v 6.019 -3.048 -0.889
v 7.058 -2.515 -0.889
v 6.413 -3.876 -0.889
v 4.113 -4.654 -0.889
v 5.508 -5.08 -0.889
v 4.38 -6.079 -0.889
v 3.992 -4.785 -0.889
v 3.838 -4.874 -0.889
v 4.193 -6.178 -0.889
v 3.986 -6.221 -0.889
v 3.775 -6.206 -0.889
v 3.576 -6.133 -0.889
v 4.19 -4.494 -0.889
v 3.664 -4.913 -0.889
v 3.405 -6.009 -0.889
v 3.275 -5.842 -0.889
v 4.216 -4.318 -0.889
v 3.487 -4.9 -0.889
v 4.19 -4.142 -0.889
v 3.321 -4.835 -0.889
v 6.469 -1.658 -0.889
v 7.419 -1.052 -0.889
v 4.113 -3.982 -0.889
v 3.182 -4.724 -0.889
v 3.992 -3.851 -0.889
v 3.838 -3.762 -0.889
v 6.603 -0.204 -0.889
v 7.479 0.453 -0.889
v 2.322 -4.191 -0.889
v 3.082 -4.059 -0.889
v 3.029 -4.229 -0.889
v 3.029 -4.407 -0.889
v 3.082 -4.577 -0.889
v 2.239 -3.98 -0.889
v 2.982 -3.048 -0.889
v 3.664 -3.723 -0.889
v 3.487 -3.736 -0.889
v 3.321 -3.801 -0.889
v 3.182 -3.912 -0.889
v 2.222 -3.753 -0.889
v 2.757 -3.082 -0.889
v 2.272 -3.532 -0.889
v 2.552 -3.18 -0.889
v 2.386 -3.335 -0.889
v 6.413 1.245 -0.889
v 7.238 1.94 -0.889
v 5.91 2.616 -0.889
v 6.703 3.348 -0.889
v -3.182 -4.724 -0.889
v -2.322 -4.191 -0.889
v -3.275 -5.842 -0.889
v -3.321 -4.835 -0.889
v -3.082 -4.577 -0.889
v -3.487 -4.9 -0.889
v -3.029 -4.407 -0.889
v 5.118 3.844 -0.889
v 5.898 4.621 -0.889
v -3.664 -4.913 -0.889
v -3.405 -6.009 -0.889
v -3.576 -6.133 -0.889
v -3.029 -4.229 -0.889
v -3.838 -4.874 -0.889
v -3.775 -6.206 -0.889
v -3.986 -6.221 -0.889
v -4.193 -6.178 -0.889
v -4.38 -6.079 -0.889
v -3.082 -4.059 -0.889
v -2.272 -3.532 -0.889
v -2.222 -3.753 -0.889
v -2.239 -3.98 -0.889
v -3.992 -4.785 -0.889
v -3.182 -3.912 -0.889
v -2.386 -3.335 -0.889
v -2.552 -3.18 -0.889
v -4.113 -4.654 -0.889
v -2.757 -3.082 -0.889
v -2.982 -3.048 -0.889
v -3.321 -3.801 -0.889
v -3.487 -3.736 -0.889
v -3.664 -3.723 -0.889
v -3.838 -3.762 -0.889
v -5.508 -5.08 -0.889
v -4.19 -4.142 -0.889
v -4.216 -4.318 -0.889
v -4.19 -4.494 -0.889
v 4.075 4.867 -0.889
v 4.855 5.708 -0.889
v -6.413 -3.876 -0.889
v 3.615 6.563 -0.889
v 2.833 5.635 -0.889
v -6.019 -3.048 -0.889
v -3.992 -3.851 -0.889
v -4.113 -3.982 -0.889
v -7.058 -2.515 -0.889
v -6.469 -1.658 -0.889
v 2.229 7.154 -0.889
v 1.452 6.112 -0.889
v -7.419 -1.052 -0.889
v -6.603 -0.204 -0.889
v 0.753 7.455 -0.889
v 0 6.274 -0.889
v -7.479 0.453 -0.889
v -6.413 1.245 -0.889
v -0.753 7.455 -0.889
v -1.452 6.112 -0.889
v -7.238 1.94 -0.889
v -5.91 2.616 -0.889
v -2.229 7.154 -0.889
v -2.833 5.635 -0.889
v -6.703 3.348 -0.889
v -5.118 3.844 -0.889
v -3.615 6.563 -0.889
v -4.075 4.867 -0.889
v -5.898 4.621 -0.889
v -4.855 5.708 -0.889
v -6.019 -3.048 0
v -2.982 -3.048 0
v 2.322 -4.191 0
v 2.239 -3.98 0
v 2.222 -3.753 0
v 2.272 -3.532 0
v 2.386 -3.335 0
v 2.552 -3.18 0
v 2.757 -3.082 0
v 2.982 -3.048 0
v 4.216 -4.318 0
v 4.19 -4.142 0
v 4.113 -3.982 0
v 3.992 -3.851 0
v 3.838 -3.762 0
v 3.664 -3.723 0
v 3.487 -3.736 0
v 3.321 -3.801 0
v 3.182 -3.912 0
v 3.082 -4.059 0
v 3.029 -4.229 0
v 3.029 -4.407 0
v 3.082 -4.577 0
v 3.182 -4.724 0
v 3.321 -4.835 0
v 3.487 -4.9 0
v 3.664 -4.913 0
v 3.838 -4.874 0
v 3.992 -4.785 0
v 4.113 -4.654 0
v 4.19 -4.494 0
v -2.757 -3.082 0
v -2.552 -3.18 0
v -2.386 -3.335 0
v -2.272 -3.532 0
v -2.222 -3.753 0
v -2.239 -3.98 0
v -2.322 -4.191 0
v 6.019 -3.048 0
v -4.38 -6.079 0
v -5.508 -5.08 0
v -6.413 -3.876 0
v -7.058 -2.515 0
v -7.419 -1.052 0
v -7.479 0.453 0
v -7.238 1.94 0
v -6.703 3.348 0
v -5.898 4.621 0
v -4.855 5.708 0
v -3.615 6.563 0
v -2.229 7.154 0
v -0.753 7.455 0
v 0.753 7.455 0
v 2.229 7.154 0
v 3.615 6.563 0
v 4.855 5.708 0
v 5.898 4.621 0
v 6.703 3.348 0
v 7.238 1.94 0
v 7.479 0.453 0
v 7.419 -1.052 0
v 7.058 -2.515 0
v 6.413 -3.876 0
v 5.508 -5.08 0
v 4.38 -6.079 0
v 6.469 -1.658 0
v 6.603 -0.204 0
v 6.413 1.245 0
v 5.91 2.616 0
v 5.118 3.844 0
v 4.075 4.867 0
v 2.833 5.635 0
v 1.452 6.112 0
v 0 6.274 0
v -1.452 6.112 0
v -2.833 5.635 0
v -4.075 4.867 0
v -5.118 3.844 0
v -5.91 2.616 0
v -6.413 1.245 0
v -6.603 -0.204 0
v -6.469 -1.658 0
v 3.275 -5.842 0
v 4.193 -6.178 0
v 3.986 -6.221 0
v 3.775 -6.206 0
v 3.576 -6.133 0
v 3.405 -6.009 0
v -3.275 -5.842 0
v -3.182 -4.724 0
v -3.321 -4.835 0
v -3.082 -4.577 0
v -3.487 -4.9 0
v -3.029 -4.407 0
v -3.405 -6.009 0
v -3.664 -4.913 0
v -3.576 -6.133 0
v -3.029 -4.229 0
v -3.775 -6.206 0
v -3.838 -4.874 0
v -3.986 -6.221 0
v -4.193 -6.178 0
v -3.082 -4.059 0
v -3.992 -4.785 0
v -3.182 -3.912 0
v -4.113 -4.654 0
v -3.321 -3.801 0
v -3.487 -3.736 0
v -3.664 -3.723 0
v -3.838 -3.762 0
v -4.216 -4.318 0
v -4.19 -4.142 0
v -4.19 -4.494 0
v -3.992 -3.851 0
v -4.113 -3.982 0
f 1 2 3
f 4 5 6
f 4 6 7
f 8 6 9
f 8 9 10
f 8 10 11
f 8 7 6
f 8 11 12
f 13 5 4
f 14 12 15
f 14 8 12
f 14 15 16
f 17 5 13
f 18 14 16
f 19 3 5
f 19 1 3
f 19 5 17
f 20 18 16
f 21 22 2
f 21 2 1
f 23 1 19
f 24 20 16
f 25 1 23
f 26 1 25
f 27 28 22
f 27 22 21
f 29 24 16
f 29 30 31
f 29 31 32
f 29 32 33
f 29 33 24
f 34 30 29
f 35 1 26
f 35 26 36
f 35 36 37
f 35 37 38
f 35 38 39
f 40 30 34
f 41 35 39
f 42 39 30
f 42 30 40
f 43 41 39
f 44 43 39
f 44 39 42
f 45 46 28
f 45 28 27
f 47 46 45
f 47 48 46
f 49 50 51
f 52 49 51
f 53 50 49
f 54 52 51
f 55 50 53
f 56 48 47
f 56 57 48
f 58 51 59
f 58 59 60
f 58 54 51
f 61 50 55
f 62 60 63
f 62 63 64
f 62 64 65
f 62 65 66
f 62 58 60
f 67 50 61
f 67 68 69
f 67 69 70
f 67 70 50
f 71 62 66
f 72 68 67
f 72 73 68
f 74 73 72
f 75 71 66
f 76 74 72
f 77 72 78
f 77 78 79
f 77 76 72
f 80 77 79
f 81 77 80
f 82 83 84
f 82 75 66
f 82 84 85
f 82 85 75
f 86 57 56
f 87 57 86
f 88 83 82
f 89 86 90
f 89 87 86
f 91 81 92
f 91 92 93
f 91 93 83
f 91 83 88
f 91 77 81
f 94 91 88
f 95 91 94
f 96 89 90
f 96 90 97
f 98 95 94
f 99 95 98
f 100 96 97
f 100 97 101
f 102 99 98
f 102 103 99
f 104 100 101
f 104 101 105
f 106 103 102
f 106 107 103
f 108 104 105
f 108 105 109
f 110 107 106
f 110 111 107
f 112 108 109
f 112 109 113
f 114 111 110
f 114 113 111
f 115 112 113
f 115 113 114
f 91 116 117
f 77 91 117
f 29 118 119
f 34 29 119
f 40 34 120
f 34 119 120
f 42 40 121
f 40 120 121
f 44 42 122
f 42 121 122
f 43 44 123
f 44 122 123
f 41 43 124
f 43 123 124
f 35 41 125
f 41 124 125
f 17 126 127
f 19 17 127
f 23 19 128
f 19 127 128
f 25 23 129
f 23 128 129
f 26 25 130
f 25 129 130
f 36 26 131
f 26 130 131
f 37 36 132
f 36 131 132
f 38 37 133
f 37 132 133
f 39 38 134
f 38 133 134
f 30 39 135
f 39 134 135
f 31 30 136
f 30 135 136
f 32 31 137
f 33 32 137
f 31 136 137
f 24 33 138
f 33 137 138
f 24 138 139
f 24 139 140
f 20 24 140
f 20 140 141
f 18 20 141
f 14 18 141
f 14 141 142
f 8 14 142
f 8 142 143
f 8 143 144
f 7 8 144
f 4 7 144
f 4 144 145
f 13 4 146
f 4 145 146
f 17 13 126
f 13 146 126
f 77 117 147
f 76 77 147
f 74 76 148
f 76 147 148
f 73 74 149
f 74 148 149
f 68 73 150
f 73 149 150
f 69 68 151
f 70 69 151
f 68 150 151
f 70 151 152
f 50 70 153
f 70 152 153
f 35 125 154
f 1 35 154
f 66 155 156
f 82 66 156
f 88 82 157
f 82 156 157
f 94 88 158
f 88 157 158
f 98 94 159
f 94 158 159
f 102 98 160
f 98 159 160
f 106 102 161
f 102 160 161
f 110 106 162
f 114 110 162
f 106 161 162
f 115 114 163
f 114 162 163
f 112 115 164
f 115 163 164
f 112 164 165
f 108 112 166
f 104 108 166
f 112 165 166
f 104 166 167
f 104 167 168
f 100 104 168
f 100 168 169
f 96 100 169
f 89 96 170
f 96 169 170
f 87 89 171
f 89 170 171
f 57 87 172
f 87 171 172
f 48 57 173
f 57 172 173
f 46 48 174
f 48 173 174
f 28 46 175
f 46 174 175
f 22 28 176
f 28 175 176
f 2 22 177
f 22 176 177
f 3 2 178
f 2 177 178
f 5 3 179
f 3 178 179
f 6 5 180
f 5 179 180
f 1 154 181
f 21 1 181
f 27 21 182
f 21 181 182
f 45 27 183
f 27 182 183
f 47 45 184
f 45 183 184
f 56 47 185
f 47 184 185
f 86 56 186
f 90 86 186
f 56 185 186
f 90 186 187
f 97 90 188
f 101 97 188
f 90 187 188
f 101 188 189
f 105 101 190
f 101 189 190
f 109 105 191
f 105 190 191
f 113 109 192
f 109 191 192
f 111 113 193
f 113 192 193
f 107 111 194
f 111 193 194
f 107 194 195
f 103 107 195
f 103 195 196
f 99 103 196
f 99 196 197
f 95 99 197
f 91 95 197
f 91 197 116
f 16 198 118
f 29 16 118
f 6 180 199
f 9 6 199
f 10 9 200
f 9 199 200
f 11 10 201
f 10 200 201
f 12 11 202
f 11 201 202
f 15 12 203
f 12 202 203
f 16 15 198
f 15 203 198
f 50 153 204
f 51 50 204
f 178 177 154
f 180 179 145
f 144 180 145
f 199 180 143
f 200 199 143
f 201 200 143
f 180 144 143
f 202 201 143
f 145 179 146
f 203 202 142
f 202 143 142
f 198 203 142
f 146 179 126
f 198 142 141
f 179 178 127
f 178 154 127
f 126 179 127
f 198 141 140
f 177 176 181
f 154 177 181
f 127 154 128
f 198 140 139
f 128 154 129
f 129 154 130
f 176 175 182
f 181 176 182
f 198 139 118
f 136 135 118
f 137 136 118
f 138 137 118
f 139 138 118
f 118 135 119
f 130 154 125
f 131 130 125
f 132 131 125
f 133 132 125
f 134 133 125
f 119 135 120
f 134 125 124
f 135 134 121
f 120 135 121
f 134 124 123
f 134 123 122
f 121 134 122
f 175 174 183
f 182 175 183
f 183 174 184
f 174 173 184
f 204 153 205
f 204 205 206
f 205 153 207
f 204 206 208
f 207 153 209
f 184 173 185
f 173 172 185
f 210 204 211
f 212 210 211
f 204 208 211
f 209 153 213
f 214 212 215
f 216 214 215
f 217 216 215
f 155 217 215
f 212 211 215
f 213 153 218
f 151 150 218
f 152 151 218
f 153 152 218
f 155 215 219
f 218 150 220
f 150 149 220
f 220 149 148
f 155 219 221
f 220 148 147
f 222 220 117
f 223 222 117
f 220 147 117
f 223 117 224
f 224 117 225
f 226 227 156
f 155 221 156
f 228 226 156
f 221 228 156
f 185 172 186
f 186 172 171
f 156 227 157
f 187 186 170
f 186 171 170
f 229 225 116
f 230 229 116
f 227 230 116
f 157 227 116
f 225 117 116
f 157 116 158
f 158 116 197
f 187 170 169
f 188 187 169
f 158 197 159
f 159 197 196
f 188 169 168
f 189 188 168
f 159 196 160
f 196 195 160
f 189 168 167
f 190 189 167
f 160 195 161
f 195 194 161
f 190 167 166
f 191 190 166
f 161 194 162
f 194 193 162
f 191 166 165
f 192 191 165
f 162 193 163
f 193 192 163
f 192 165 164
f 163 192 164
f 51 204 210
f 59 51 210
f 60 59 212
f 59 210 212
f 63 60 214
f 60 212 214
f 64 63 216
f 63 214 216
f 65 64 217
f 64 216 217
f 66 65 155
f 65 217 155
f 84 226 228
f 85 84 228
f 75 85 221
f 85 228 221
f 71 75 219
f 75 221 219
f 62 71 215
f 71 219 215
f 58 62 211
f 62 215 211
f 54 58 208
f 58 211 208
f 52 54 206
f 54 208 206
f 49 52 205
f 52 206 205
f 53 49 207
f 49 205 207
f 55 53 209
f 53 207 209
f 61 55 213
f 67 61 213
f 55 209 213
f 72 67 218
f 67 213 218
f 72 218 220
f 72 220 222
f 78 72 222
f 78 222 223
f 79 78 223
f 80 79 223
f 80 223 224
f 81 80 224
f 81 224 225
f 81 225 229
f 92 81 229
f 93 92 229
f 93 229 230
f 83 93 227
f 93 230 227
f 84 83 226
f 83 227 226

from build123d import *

# Parameters (mm, degrees)
BASE_SKETCH_R = 0.5969
BASE_DEPTH    = 0.889


with BuildPart() as part:
    # Base Sketch → Base (new body)
    with BuildSketch(Plane.XY):
        with BuildLine():
            Line((-2.321834428, -4.191), (-3.275039722, -5.842))
            ThreePointArc((-3.275039722, -5.842), (-3.775058057, -6.206035718), (-4.38041724, -6.079226415))
            ThreePointArc((-4.38041724, -6.079226415), (0, 7.493), (4.38041724, -6.079226415))
            ThreePointArc((4.38041724, -6.079226415), (3.775058057, -6.206035718), (3.275039722, -5.842))
            Line((3.275039722, -5.842), (2.321834428, -4.191))
            ThreePointArc((2.321834428, -4.191), (2.321834428, -3.429), (2.981745785, -3.048))
            Line((2.981745785, -3.048), (6.018835366, -3.048))
            ThreePointArc((6.018835366, -3.048), (0, 6.2738), (-6.018835366, -3.048))
            Line((-6.018835366, -3.048), (-2.981745785, -3.048))
            ThreePointArc((-2.981745785, -3.048), (-2.321834428, -3.429), (-2.321834428, -4.191))
        make_face()
        with Locations((3.6195, -4.318)):
            Circle(BASE_SKETCH_R, mode=Mode.SUBTRACT)
        with Locations(Location((-3.6195, -4.318, 0), (0, 0, 180))):
            Circle(BASE_SKETCH_R, mode=Mode.SUBTRACT)
    extrude(amount=-BASE_DEPTH)


solid = part.part
